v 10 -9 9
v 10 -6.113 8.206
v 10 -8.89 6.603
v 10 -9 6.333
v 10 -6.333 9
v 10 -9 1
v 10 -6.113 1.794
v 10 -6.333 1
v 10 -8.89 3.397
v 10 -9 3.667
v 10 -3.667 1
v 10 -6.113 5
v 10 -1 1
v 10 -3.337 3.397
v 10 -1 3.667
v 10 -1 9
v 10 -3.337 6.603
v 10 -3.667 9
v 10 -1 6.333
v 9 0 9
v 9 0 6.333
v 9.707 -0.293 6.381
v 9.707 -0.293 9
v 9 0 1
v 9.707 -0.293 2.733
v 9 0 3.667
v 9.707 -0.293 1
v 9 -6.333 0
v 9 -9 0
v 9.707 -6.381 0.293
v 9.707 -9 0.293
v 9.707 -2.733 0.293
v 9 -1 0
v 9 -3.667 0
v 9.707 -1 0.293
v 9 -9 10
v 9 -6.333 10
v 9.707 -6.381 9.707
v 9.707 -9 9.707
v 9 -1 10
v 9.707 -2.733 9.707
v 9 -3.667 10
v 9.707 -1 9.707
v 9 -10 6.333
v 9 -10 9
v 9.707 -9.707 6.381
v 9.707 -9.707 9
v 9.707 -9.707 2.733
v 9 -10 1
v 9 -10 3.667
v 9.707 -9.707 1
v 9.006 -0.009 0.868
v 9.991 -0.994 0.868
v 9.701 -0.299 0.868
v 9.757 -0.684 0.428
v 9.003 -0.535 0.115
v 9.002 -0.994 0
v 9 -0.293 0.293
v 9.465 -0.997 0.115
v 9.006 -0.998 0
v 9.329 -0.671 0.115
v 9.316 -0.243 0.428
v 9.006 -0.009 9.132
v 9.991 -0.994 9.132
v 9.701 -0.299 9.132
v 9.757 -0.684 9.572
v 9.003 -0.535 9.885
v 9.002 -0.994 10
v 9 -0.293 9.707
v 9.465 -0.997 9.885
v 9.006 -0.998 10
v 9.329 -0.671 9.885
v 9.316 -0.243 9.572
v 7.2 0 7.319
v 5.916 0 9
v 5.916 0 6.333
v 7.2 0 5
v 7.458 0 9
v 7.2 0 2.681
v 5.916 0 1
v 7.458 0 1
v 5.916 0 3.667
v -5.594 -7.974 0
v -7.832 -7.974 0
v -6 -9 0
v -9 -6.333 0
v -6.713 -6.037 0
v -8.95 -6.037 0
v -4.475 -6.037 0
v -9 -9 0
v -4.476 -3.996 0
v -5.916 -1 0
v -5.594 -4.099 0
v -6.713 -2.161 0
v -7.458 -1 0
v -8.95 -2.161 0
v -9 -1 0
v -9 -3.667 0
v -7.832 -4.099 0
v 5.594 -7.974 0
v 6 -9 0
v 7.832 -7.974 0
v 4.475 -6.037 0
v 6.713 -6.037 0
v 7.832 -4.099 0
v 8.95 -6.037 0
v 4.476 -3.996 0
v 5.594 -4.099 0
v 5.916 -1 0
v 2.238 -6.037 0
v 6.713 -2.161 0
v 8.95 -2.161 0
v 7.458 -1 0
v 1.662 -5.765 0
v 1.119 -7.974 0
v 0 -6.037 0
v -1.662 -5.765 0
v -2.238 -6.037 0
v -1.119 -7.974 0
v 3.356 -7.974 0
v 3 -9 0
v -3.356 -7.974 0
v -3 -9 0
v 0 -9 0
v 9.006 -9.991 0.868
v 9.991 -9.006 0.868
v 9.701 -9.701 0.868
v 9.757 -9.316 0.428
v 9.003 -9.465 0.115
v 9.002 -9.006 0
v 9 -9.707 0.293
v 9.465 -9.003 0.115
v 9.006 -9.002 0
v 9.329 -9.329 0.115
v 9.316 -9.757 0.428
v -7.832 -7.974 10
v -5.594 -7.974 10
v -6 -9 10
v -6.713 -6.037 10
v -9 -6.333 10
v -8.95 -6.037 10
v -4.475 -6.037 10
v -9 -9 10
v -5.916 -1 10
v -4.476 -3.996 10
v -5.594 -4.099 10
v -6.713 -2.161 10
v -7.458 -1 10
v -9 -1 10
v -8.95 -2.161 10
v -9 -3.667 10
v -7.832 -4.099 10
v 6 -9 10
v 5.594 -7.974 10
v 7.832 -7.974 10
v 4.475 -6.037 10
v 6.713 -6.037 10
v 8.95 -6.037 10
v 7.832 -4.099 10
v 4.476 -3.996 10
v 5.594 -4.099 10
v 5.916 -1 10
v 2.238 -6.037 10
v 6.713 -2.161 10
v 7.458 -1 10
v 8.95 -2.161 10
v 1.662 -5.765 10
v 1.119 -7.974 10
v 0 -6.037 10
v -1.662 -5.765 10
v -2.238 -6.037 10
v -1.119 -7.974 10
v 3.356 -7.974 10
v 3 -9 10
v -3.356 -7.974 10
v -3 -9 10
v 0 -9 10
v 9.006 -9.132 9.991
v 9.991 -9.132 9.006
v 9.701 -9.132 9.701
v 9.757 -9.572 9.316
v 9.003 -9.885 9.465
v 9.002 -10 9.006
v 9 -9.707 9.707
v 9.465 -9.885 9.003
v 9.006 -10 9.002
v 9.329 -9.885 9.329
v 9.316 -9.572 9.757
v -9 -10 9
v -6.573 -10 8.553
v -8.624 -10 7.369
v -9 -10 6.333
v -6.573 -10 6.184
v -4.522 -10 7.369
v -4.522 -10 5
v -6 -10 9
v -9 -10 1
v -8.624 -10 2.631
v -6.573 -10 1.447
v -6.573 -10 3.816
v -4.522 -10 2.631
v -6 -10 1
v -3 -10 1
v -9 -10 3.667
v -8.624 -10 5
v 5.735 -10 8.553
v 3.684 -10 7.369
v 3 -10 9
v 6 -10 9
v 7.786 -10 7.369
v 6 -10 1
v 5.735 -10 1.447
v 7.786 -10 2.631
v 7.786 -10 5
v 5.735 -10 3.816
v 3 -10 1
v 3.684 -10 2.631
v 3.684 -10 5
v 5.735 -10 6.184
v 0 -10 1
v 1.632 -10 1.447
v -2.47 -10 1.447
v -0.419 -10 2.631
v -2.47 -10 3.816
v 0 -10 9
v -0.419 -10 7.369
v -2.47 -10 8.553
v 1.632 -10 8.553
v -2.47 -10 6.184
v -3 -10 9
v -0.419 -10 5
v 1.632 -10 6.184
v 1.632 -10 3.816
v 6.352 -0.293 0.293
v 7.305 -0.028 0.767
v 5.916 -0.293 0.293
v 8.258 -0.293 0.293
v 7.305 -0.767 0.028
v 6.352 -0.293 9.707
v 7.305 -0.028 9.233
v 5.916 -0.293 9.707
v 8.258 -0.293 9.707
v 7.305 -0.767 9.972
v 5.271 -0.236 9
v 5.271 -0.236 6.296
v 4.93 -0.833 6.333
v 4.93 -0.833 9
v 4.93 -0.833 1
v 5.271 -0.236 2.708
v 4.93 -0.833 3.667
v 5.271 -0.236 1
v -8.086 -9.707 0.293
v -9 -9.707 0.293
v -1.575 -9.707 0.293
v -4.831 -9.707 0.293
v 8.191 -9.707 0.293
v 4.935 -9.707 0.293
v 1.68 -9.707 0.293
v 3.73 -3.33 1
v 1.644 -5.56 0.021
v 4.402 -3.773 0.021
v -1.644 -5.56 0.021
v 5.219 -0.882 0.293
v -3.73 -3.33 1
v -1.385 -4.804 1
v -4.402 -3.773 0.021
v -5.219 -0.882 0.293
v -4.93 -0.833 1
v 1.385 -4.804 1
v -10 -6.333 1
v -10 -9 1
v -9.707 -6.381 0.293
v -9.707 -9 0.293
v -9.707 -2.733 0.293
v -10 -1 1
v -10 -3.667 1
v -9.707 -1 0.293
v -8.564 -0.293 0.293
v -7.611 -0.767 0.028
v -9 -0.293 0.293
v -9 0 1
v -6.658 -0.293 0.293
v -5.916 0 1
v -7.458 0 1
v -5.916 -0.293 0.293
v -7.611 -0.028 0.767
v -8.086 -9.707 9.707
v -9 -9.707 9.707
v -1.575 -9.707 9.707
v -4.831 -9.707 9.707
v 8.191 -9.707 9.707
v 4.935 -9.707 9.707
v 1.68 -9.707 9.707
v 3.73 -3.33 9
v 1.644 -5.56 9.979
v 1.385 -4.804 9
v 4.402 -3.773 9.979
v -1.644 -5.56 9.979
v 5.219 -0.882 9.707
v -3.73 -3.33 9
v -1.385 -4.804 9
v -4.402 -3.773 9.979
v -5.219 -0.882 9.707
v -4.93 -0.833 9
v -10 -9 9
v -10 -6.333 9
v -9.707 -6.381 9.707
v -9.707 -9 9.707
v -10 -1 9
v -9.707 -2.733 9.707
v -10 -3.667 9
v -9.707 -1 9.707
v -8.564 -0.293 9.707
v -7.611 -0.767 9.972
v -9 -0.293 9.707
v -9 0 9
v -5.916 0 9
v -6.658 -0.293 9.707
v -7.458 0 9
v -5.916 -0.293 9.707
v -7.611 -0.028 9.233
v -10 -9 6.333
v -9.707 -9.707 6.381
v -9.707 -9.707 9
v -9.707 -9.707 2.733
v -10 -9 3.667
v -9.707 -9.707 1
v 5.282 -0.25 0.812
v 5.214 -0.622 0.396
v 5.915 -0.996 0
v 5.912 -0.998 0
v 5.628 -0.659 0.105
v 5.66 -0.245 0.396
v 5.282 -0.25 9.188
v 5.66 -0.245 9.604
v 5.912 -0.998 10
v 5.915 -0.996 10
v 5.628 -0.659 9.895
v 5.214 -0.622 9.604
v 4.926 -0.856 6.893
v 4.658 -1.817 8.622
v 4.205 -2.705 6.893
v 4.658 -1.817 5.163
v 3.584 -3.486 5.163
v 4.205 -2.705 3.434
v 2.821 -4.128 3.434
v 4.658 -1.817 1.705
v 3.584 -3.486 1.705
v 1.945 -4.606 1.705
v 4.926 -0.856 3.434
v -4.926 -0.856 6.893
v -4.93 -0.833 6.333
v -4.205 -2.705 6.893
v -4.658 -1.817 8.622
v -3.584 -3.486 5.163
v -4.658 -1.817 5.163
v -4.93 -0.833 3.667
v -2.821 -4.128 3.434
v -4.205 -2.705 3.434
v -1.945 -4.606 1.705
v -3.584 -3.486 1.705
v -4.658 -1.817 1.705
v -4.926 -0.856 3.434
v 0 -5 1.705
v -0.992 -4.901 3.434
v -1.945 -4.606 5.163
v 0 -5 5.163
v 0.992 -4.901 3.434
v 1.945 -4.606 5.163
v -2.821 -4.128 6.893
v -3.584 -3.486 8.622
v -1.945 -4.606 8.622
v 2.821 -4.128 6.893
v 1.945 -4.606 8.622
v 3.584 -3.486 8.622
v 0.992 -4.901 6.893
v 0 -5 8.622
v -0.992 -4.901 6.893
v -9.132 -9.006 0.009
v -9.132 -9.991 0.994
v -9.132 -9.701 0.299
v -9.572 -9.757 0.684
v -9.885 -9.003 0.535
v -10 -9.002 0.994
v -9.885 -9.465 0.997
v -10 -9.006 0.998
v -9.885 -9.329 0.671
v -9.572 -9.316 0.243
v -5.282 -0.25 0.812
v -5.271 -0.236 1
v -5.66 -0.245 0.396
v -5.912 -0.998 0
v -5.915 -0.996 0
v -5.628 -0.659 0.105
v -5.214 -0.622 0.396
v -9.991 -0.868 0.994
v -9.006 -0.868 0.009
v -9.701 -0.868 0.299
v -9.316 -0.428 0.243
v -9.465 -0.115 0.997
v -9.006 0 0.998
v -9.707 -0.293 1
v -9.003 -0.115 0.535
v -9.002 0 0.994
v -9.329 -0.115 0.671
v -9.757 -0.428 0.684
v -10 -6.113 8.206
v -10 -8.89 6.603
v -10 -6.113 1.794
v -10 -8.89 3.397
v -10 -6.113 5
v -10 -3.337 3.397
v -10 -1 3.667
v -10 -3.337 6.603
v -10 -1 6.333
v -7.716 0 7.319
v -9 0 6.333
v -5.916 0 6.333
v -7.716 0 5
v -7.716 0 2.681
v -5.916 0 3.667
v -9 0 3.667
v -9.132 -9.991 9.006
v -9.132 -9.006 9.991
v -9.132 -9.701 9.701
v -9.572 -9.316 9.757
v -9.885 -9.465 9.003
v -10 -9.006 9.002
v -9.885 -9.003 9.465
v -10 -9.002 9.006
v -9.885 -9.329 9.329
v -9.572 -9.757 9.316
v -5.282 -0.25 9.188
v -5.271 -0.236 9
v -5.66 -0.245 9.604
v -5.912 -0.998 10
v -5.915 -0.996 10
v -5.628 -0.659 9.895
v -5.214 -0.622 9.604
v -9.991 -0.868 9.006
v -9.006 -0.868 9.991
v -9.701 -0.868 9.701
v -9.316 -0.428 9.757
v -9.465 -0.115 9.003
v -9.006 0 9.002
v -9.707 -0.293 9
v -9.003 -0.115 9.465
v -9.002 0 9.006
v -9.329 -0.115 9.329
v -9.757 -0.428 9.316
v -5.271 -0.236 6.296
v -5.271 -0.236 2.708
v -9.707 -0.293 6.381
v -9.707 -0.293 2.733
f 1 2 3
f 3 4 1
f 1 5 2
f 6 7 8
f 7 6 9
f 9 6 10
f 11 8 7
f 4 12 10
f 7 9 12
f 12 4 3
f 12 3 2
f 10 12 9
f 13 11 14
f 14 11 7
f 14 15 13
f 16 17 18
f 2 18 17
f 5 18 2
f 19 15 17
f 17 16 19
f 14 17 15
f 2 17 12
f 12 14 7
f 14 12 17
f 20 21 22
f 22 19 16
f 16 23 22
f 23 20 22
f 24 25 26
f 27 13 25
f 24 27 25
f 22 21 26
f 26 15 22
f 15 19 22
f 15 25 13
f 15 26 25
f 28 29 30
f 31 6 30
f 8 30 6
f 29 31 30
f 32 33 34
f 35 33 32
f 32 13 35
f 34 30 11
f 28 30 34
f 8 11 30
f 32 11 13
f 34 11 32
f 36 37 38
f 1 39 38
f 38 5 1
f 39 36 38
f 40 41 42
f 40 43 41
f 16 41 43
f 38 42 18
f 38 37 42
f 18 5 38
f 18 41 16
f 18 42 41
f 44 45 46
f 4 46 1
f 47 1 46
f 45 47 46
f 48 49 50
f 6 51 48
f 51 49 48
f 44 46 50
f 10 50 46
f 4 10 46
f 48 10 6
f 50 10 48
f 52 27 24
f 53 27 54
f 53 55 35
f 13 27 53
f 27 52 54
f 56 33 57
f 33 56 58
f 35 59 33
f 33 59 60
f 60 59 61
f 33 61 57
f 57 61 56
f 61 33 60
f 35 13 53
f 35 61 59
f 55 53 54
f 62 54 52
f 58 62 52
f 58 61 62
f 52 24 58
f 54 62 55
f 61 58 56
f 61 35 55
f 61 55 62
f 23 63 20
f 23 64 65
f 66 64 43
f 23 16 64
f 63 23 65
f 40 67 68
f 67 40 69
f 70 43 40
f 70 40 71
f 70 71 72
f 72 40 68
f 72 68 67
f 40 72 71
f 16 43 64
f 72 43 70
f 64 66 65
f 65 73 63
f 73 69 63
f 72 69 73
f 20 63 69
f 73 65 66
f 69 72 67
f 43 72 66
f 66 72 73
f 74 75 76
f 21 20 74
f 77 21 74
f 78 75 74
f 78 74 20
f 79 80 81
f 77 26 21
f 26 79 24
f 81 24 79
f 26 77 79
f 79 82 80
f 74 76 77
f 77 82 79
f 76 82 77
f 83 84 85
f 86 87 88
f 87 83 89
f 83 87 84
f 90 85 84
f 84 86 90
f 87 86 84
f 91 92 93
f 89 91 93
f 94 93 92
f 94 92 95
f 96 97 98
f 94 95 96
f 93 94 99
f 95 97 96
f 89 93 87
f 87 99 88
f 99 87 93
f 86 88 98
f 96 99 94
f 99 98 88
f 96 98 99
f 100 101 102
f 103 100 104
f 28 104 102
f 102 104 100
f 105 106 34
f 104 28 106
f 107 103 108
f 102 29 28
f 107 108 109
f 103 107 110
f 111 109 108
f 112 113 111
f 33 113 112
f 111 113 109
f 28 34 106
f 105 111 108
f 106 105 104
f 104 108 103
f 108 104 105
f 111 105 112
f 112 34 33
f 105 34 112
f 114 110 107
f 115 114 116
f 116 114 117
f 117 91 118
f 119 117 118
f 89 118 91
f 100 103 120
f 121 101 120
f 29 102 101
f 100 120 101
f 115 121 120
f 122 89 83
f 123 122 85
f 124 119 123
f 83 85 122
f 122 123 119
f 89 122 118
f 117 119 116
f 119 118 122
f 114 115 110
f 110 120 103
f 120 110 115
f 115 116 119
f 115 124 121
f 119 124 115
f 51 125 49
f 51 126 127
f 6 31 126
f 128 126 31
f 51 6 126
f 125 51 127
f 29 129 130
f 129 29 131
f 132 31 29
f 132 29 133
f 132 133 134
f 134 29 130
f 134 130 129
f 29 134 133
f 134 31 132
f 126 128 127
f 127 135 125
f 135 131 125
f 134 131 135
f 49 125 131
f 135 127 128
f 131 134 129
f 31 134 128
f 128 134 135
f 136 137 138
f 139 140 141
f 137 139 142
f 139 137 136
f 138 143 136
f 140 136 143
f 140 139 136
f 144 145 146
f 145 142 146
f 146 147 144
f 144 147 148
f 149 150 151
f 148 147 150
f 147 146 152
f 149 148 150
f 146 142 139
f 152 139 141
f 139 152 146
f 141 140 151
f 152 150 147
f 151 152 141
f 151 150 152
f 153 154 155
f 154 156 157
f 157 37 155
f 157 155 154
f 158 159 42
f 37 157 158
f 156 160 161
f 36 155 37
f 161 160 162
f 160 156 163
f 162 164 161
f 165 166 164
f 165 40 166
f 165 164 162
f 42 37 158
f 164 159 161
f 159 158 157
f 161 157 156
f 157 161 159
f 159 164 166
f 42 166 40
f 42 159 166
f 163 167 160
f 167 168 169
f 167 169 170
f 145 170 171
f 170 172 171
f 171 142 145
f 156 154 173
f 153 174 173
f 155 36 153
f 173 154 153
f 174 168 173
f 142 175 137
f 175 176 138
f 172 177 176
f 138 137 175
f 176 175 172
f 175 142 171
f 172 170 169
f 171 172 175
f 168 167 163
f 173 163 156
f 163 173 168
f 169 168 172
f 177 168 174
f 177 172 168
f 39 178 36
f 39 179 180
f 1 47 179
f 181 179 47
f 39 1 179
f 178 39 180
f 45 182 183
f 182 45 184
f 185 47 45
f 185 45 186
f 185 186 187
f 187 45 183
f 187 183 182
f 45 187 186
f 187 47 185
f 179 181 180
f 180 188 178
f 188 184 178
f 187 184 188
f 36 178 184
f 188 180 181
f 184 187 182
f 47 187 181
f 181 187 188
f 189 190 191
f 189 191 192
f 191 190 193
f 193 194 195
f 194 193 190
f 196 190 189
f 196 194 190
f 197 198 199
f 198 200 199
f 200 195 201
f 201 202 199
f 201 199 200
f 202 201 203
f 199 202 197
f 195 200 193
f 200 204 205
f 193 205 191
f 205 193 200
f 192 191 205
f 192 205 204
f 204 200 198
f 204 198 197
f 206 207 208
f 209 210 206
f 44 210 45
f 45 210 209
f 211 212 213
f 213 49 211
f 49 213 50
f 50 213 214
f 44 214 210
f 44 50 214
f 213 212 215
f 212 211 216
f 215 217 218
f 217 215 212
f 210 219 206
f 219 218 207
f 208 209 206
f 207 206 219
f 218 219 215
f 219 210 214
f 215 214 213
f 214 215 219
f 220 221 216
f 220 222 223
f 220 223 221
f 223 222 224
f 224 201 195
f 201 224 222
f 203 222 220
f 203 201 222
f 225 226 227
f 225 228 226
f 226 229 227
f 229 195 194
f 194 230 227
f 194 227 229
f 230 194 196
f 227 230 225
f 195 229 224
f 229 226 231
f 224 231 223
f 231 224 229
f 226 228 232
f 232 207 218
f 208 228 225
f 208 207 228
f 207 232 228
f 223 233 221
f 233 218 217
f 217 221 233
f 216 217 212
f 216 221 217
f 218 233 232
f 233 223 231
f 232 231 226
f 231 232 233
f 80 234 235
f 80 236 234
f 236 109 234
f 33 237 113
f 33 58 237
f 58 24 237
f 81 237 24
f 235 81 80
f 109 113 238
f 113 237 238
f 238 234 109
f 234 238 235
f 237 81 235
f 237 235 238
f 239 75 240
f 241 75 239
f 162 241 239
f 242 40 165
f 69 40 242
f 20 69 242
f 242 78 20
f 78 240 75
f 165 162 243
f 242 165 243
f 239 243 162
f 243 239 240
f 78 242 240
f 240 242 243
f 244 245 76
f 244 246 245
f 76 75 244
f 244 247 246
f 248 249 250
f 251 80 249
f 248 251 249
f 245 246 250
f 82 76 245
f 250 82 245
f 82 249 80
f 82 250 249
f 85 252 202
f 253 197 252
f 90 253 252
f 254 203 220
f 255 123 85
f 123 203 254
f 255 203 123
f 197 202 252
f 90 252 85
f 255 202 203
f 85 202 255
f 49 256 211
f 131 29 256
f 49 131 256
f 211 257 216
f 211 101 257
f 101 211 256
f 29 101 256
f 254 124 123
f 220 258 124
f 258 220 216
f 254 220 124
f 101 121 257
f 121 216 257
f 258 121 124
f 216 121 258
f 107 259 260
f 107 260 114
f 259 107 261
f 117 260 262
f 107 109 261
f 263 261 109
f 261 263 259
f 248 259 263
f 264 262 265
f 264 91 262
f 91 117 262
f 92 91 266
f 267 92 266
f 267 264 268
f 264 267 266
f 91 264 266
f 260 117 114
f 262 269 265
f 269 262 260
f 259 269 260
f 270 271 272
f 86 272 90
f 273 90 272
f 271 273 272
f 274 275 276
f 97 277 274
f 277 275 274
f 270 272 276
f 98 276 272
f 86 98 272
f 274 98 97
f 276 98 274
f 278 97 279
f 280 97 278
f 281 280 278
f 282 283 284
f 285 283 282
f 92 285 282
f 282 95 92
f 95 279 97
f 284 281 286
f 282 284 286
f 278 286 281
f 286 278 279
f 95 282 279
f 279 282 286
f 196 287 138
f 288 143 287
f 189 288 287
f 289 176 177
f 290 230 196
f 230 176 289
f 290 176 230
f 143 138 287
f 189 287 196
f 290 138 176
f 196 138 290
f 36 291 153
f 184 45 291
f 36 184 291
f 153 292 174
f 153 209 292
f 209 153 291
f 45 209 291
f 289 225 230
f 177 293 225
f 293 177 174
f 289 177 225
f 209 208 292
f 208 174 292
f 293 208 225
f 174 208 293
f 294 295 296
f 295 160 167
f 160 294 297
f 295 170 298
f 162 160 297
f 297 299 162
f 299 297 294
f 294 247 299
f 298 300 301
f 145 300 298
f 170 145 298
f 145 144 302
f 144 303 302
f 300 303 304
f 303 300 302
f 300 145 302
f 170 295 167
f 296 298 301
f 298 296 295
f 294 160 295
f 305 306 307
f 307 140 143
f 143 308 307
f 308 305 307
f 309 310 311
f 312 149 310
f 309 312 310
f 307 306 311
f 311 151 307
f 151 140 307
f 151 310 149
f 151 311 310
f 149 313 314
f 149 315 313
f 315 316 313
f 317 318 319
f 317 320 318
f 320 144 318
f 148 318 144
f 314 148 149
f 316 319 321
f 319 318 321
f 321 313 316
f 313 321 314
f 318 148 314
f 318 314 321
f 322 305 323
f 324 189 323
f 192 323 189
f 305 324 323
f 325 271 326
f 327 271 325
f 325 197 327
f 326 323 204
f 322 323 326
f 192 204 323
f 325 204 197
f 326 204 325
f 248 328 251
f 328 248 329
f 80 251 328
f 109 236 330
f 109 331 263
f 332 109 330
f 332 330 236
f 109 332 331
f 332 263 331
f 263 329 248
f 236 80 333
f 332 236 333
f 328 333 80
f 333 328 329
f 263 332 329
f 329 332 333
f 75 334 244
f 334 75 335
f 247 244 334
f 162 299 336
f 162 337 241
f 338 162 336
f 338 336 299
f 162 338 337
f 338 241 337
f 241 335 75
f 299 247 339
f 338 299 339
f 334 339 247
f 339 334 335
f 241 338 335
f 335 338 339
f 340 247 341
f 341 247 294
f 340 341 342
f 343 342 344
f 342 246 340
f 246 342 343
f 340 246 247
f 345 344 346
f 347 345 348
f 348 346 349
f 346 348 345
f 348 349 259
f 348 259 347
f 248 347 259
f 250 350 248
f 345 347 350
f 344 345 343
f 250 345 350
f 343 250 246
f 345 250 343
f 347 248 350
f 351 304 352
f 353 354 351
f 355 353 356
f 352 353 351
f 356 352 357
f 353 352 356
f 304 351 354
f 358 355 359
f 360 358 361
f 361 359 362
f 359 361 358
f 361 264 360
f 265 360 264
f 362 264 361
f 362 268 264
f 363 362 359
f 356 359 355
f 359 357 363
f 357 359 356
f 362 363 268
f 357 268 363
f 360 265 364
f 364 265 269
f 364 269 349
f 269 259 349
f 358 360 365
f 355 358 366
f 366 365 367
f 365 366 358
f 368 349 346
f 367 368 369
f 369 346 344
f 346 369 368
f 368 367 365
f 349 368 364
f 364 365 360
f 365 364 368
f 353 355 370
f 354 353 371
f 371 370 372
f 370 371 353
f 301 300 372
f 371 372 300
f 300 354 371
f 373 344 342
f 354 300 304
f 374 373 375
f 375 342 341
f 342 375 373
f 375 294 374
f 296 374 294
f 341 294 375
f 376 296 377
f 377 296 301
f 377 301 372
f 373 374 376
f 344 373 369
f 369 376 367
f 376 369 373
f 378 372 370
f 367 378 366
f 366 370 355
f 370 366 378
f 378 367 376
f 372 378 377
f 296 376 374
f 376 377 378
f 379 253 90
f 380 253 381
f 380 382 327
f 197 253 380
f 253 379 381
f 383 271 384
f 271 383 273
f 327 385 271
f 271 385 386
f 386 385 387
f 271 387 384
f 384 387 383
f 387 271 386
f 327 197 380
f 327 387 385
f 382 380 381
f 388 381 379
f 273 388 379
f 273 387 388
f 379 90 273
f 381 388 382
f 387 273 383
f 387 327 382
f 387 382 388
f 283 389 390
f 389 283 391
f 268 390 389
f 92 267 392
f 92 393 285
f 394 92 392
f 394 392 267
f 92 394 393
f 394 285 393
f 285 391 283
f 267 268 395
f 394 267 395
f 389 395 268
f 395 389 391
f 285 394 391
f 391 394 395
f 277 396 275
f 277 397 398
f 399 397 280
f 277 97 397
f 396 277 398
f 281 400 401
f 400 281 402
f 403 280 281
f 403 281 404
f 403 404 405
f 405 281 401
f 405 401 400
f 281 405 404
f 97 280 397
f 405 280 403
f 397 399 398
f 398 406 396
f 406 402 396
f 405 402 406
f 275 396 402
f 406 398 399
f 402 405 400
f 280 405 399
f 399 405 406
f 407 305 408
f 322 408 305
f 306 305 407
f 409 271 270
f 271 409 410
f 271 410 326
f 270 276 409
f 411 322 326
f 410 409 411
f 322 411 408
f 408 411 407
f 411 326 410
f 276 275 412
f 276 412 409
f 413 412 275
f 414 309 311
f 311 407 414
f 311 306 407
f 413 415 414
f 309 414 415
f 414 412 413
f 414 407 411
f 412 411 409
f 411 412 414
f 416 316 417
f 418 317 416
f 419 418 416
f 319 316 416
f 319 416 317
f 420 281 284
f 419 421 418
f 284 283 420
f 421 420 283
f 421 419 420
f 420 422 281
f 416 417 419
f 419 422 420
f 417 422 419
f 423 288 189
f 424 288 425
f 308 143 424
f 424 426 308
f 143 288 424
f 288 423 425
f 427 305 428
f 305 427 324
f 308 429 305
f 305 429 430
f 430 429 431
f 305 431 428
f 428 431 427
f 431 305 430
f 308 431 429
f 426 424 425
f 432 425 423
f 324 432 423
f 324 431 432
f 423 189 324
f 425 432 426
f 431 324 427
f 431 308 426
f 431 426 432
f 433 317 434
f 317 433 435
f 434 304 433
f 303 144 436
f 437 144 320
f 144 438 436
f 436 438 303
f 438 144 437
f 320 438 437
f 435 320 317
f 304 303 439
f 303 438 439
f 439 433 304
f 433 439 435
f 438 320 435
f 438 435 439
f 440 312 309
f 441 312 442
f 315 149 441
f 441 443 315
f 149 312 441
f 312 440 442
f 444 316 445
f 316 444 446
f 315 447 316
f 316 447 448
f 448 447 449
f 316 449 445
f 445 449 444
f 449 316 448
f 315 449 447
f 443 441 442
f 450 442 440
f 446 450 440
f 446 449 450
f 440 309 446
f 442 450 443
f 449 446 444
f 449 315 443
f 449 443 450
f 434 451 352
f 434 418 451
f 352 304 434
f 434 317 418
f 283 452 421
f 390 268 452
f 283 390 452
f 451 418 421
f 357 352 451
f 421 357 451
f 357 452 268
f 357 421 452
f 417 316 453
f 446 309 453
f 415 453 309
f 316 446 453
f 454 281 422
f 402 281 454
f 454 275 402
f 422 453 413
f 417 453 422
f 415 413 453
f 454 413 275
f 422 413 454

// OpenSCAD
// CSG file generated from FreeCAD 0.18.16093 (Git)
group() {
 group(){
multmatrix([[2.22044604925e-16, -1.0, 0.0,            0.0], [1.0, 2.22044604925e-16, 0.0, 0.0], [0.0, 0.0, 1.0, 0.0], [             0, 0, 0, 1]]){
polyhedron ( points = [[-1.000000,-10.000000,1.000000],[-1.000000,-10.000000,9.000000],[-9.000000,-10.000000,1.000000],[-9.000000,-10.000000,9.000000],[-0.000000,-9.000000,1.000000],[-0.000000,-9.000000,9.000000],[-1.000000,-9.000000,0.000000],[-9.000000,-9.000000,0.000000],[-1.000000,-9.000000,10.000000],[-9.000000,-9.000000,10.000000],[-10.000000,-9.000000,1.000000],[-10.000000,-9.000000,9.000000],[-0.000000,-5.916080,1.000000],[-0.000000,-5.916080,9.000000],[-1.000000,-5.916080,0.000000],[-9.000000,9.000000,-0.000000],[-1.000000,5.916080,0.000000],[-1.000000,9.000000,-0.000000],[-1.000000,-5.916080,10.000000],[-9.000000,9.000000,10.000000],[-1.000000,5.916080,10.000000],[-1.000000,9.000000,10.000000],[-10.000000,9.000000,1.000000],[-10.000000,9.000000,9.000000],[-0.833333,-4.930067,1.000000],[-0.833333,-4.930067,9.000000],[-0.833333,4.930067,1.000000],[-1.000000,10.000000,1.000000],[-9.000000,10.000000,1.000000],[0.000000,5.916080,1.000000],[0.000000,9.000000,1.000000],[-0.833333,4.930067,9.000000],[-1.000000,10.000000,9.000000],[-9.000000,10.000000,9.000000],[0.000000,5.916080,9.000000],[0.000000,9.000000,9.000000],[-1.000000,-10.000000,3.666667],[-1.000000,-10.000000,6.333333],[-3.666667,-10.000000,1.000000],[-6.333333,-10.000000,1.000000],[-3.666667,-10.000000,9.000000],[-6.333333,-10.000000,9.000000],[-9.000000,-10.000000,3.666667],[-9.000000,-10.000000,6.333333],[-0.292893,-9.707107,1.000000],[-0.292893,-9.707107,9.000000],[-0.000000,-9.000000,3.666667],[-0.000000,-9.000000,6.333333],[-1.000000,-9.707107,0.292893],[-3.666667,-9.000000,-0.000000],[-6.333333,-9.000000,-0.000000],[-9.000000,-9.707107,0.292893],[-1.000000,-9.707107,9.707107],[-3.666667,-9.000000,10.000000],[-6.333333,-9.000000,10.000000],[-9.000000,-9.707107,9.707107],[-9.707107,-9.707107,1.000000],[-9.707107,-9.707107,9.000000],[-10.000000,-9.000000,3.666667],[-10.000000,-9.000000,6.333333],[-1.000000,-9.000000,0.000000],[-1.000000,-9.000000,0.000000],[-1.000000,-9.000000,0.000000],[-0.292893,-9.000000,0.292893],[-1.000000,-9.000000,10.000000],[-1.000000,-9.000000,10.000000],[-1.000000,-9.000000,10.000000],[-0.292893,-9.000000,9.707107],[-0.000000,-7.458040,1.000000],[-0.000000,-7.458040,9.000000],[-0.000000,-5.916080,3.666667],[-0.000000,-5.916080,6.333333],[-1.000000,-7.458040,-0.000000],[-9.000000,-6.000000,-0.000000],[-9.000000,-3.000000,-0.000000],[-9.000000,0.000000,-0.000000],[-9.000000,3.000000,-0.000000],[-9.000000,6.000000,-0.000000],[-3.995793,4.475895,0.000000],[-5.765221,1.661995,0.000000],[-5.765221,-1.661995,0.000000],[-3.995793,-4.475895,0.000000],[-3.666667,9.000000,-0.000000],[-6.333333,9.000000,-0.000000],[-1.000000,7.458040,-0.000000],[-9.000000,-9.000000,0.000000],[-9.000000,-9.000000,0.000000],[-9.000000,-9.000000,0.000000],[-9.707107,-9.000000,0.292893],[-1.000000,-7.458040,10.000000],[-9.000000,-6.000000,10.000000],[-9.000000,-3.000000,10.000000],[-9.000000,0.000000,10.000000],[-9.000000,3.000000,10.000000],[-9.000000,6.000000,10.000000],[-3.995793,4.475895,10.000000],[-5.765221,1.661995,10.000000],[-5.765221,-1.661995,10.000000],[-3.995793,-4.475895,10.000000],[-3.666667,9.000000,10.000000],[-6.333333,9.000000,10.000000],[-1.000000,7.458040,10.000000],[-10.000000,-9.000000,9.000000],[-10.000000,-9.000000,9.000000],[-10.000000,-9.000000,9.000000],[-9.707107,-9.000000,9.707107],[-10.000000,-6.000000,1.000000],[-10.000000,-3.000000,1.000000],[-10.000000,0.000000,1.000000],[-10.000000,3.000000,1.000000],[-10.000000,6.000000,1.000000],[-10.000000,-6.000000,9.000000],[-10.000000,-3.000000,9.000000],[-10.000000,0.000000,9.000000],[-10.000000,3.000000,9.000000],[-10.000000,6.000000,9.000000],[-10.000000,9.000000,3.666667],[-10.000000,9.000000,6.333333],[-0.292893,-5.916080,0.292893],[-0.292893,-5.916080,9.707107],[-0.236237,-5.270583,1.000000],[-0.236237,-5.270583,9.000000],[-0.833333,-4.930067,3.666667],[-0.833333,-4.930067,6.333333],[-9.707107,9.000000,0.292893],[-0.882149,5.218863,0.292893],[-3.329828,3.729913,1.000000],[-4.804351,1.384996,1.000000],[-4.804351,-1.384996,1.000000],[-3.329828,-3.729913,1.000000],[-0.882149,-5.218863,0.292893],[-1.000000,9.707107,0.292893],[-9.000000,9.707107,0.292893],[-3.666667,10.000000,1.000000],[-6.333333,10.000000,1.000000],[-0.292893,5.916080,0.292893],[0.000000,7.458040,1.000000],[-0.292893,9.000000,0.292893],[-9.707107,9.000000,9.707107],[-0.882149,5.218863,9.707107],[-3.329828,3.729913,9.000000],[-4.804351,1.384996,9.000000],[-4.804351,-1.384996,9.000000],[-3.329828,-3.729913,9.000000],[-0.882149,-5.218863,9.707107],[-1.000000,9.707107,9.707107],[-9.000000,9.707107,9.707107],[-3.666667,10.000000,9.000000],[-6.333333,10.000000,9.000000],[-0.292893,5.916080,9.707107],[0.000000,7.458040,9.000000],[-0.292893,9.000000,9.707107],[-9.707107,9.707107,1.000000],[-9.000000,10.000000,3.666667],[-9.000000,10.000000,6.333333],[-9.707107,9.707107,9.000000],[-1.000000,-5.916080,0.000000],[-1.000000,-5.916080,0.000000],[-1.000000,-5.916080,0.000000],[-1.000000,-5.916080,10.000000],[-1.000000,-5.916080,10.000000],[-1.000000,-5.916080,10.000000],[-0.833333,4.930067,3.666667],[-0.833333,4.930067,6.333333],[-9.000000,10.000000,1.000000],[-9.000000,10.000000,1.000000],[-9.000000,10.000000,1.000000],[-1.000000,5.916080,0.000000],[-1.000000,5.916080,0.000000],[-1.000000,5.916080,0.000000],[-0.236237,5.270583,1.000000],[0.000000,9.000000,1.000000],[0.000000,9.000000,1.000000],[0.000000,9.000000,1.000000],[-0.292893,9.707107,1.000000],[-1.000000,10.000000,3.666667],[-1.000000,10.000000,6.333333],[0.000000,5.916080,3.666667],[0.000000,5.916080,6.333333],[0.000000,9.000000,3.666667],[0.000000,9.000000,6.333333],[-9.000000,10.000000,9.000000],[-9.000000,10.000000,9.000000],[-9.000000,10.000000,9.000000],[-1.000000,5.916080,10.000000],[-1.000000,5.916080,10.000000],[-1.000000,5.916080,10.000000],[-0.236237,5.270583,9.000000],[0.000000,9.000000,9.000000],[0.000000,9.000000,9.000000],[0.000000,9.000000,9.000000],[-0.292893,9.707107,9.000000],[-6.113249,-10.000000,1.793733],[-6.113249,-10.000000,8.206267],[-8.889957,-10.000000,6.603134],[-8.889957,-10.000000,3.396866],[-6.113249,-10.000000,5.000000],[-3.336540,-10.000000,3.396866],[-3.336540,-10.000000,6.603134],[-0.292893,-9.707107,6.380673],[-0.292893,-9.707107,2.733257],[-6.380673,-9.707107,0.292893],[-2.733257,-9.707107,0.292893],[-6.380673,-9.707107,9.707107],[-2.733257,-9.707107,9.707107],[-9.707107,-9.707107,6.380673],[-9.707107,-9.707107,2.733257],[-0.997414,-9.465114,0.114753],[-0.534886,-9.002586,0.114753],[-0.299037,-9.700963,0.868459],[-0.008705,-9.005512,0.868459],[-0.994488,-9.991296,0.868459],[-0.994260,-9.002397,0.000019],[-0.997604,-9.005740,0.000019],[-0.671110,-9.328890,0.114753],[-0.684114,-9.756659,0.427564],[-0.243341,-9.315886,0.427564],[-0.997414,-9.465114,9.885247],[-0.534886,-9.002586,9.885247],[-0.299037,-9.700963,9.131541],[-0.008705,-9.005512,9.131541],[-0.994488,-9.991296,9.131541],[-0.994260,-9.002397,9.999981],[-0.997604,-9.005740,9.999981],[-0.671110,-9.328890,9.885247],[-0.684114,-9.756659,9.572436],[-0.243341,-9.315886,9.572436],[-0.000000,-7.199661,2.680713],[-0.000000,-7.199661,7.319287],[-0.000000,-7.199661,5.000000],[-6.036599,-4.475196,0.000000],[-6.036599,4.475196,0.000000],[-6.036599,8.950392,0.000000],[-2.160966,6.712794,0.000000],[-6.036599,-8.950392,0.000000],[-2.160966,-6.712794,0.000000],[-6.036599,0.000000,0.000000],[-7.974416,7.831593,0.000000],[-7.974416,5.593995,0.000000],[-6.036599,6.712794,0.000000],[-4.098783,5.593995,0.000000],[-2.160966,8.950392,0.000000],[-4.098783,7.831593,0.000000],[-7.974416,-5.593995,0.000000],[-7.974416,-7.831593,0.000000],[-6.036599,-6.712794,0.000000],[-4.098783,-5.593995,0.000000],[-2.160966,-8.950392,0.000000],[-4.098783,-7.831593,0.000000],[-6.036599,-2.237598,0.000000],[-6.036599,2.237598,0.000000],[-7.974416,-3.356397,0.000000],[-7.974416,3.356397,0.000000],[-7.974416,1.118799,0.000000],[-7.974416,-1.118799,0.000000],[-9.002586,-9.465114,0.114753],[-9.465114,-9.002586,0.114753],[-9.700963,-9.700963,0.868459],[-9.991296,-9.005512,0.868459],[-9.005512,-9.991296,0.868459],[-9.005740,-9.002397,0.000019],[-9.002397,-9.005740,0.000019],[-9.328890,-9.328890,0.114753],[-9.315886,-9.756659,0.427564],[-9.756659,-9.315886,0.427564],[-6.036599,-4.475196,10.000000],[-6.036599,4.475196,10.000000],[-6.036599,8.950392,10.000000],[-2.160966,6.712794,10.000000],[-6.036599,-8.950392,10.000000],[-2.160966,-6.712794,10.000000],[-6.036599,0.000000,10.000000],[-7.974416,7.831593,10.000000],[-7.974416,5.593995,10.000000],[-6.036599,6.712794,10.000000],[-4.098783,5.593995,10.000000],[-2.160966,8.950392,10.000000],[-4.098783,7.831593,10.000000],[-7.974416,-5.593995,10.000000],[-7.974416,-7.831593,10.000000],[-6.036599,-6.712794,10.000000],[-4.098783,-5.593995,10.000000],[-2.160966,-8.950392,10.000000],[-4.098783,-7.831593,10.000000],[-6.036599,-2.237598,10.000000],[-6.036599,2.237598,10.000000],[-7.974416,-3.356397,10.000000],[-7.974416,3.356397,10.000000],[-7.974416,1.118799,10.000000],[-7.974416,-1.118799,10.000000],[-9.885247,-9.465114,9.002586],[-9.885247,-9.002586,9.465114],[-9.131541,-9.700963,9.700963],[-9.131541,-9.005512,9.991296],[-9.131541,-9.991296,9.005512],[-9.999981,-9.002397,9.005740],[-9.999981,-9.005740,9.002397],[-9.885247,-9.328890,9.328890],[-9.572436,-9.756659,9.315886],[-9.572436,-9.315886,9.756659],[-10.000000,4.521509,5.000000],[-10.000000,8.624108,7.368637],[-10.000000,8.624108,2.631363],[-10.000000,-7.786290,7.368637],[-10.000000,-7.786290,2.631363],[-10.000000,-3.683690,5.000000],[-10.000000,0.418909,2.631363],[-10.000000,0.418909,7.368637],[-10.000000,6.572808,8.552956],[-10.000000,6.572808,6.184319],[-10.000000,4.521509,7.368637],[-10.000000,6.572808,3.815681],[-10.000000,6.572808,1.447045],[-10.000000,4.521509,2.631363],[-10.000000,8.624108,5.000000],[-10.000000,-5.734990,8.552956],[-10.000000,-5.734990,1.447045],[-10.000000,-7.786290,5.000000],[-10.000000,-5.734990,3.815681],[-10.000000,-3.683690,2.631363],[-10.000000,-5.734990,6.184319],[-10.000000,-3.683690,7.368637],[-10.000000,-1.632390,1.447045],[-10.000000,2.470209,1.447045],[-10.000000,2.470209,3.815681],[-10.000000,-1.632390,8.552956],[-10.000000,2.470209,6.184319],[-10.000000,2.470209,8.552956],[-10.000000,0.418909,5.000000],[-10.000000,-1.632390,6.184319],[-10.000000,-1.632390,3.815681],[-0.292893,-6.352061,0.292893],[-0.292893,-8.257871,0.292893],[-0.027516,-7.304966,0.767029],[-0.767029,-7.304966,0.027516],[-0.292893,-6.352061,9.707107],[-0.292893,-8.257871,9.707107],[-0.027516,-7.304966,9.232971],[-0.767029,-7.304966,9.972484],[-0.236237,-5.270583,6.295946],[-0.236237,-5.270583,2.707638],[-9.707107,1.575469,0.292893],[-9.707107,-4.935441,0.292893],[-9.707107,8.086378,0.292893],[-9.707107,4.830924,0.292893],[-9.707107,-8.190895,0.292893],[-9.707107,-1.679986,0.292893],[-3.772892,-4.402255,0.020654],[-5.559988,-1.643504,0.020654],[-5.559988,1.643504,0.020654],[-3.772892,4.402255,0.020654],[-6.380673,9.707107,0.292893],[-2.733257,9.707107,0.292893],[-0.292893,8.564018,0.292893],[-0.292893,6.658209,0.292893],[-0.767029,7.611114,0.027516],[-0.027516,7.611114,0.767029],[-9.707107,1.575469,9.707107],[-9.707107,-4.935441,9.707107],[-9.707107,8.086378,9.707107],[-9.707107,4.830924,9.707107],[-9.707107,-8.190895,9.707107],[-9.707107,-1.679986,9.707107],[-3.772892,-4.402255,9.979345],[-5.559988,-1.643504,9.979345],[-5.559988,1.643504,9.979345],[-3.772892,4.402255,9.979345],[-6.380673,9.707107,9.707107],[-2.733257,9.707107,9.707107],[-0.292893,8.564018,9.707107],[-0.292893,6.658209,9.707107],[-0.767029,7.611114,9.972484],[-0.027516,7.611114,9.232971],[-9.707107,9.707107,6.380673],[-9.707107,9.707107,2.733257],[-0.249882,-5.282115,0.811822],[-0.995799,-5.914656,0.000010],[-0.997895,-5.912175,0.000010],[-0.658567,-5.627517,0.105486],[-0.621810,-5.214414,0.396148],[-0.245116,-5.660123,0.396148],[-0.249882,-5.282115,9.188178],[-0.997895,-5.912175,9.999990],[-0.995799,-5.914656,9.999990],[-0.658567,-5.627517,9.894514],[-0.245116,-5.660123,9.603852],[-0.621810,-5.214414,9.603852],[-3.486147,3.584240,5.163412],[-3.486147,-3.584240,5.163412],[-1.816883,-4.658212,8.622211],[-1.816883,-4.658212,1.704613],[-4.606014,-1.945413,1.704613],[-1.816883,4.658212,8.622211],[-4.606014,1.945413,1.704613],[-1.816883,4.658212,1.704613],[-5.000000,0.000000,5.163412],[-4.606014,1.945413,8.622211],[-4.606014,-1.945413,8.622211],[-0.856120,-4.926161,6.892811],[-2.705344,-4.204892,6.892811],[-1.816883,-4.658212,5.163412],[-2.705344,-4.204892,3.434012],[-4.128221,-2.820956,3.434012],[-3.486147,-3.584240,1.704613],[-0.856120,-4.926161,3.434012],[-2.705344,4.204892,6.892811],[-0.856120,4.926161,6.892811],[-1.816883,4.658212,5.163412],[-4.128221,2.820956,3.434012],[-2.705344,4.204892,3.434012],[-3.486147,3.584240,1.704613],[-0.856120,4.926161,3.434012],[-5.000000,0.000000,1.704613],[-4.900514,0.992454,3.434012],[-4.606014,1.945413,5.163412],[-4.900514,-0.992454,3.434012],[-4.606014,-1.945413,5.163412],[-4.128221,2.820956,6.892811],[-3.486147,3.584240,8.622211],[-4.128221,-2.820956,6.892811],[-3.486147,-3.584240,8.622211],[-5.000000,0.000000,8.622211],[-4.900514,-0.992454,6.892811],[-4.900514,0.992454,6.892811],[-9.465114,9.885247,0.997414],[-9.002586,9.885247,0.534886],[-9.700963,9.131541,0.299037],[-9.005512,9.131541,0.008705],[-9.991296,9.131541,0.994488],[-9.002397,9.999981,0.994260],[-9.005740,9.999981,0.997604],[-9.328890,9.885247,0.671110],[-9.756659,9.572436,0.684114],[-9.315886,9.572436,0.243341],[-0.249882,5.282115,0.811822],[-0.997895,5.912175,0.000010],[-0.995799,5.914656,0.000010],[-0.658567,5.627517,0.105486],[-0.245116,5.660123,0.396148],[-0.621810,5.214414,0.396148],[-0.114753,9.002586,0.534886],[-0.114753,9.465114,0.997414],[-0.868459,9.700963,0.299037],[-0.868459,9.991296,0.994488],[-0.868459,9.005512,0.008705],[-0.000019,9.005740,0.997604],[-0.000019,9.002397,0.994260],[-0.114753,9.328890,0.671110],[-0.427564,9.315886,0.243341],[-0.427564,9.756659,0.684114],[-6.113249,10.000000,1.793733],[-6.113249,10.000000,8.206267],[-8.889957,10.000000,6.603134],[-8.889957,10.000000,3.396866],[-6.113249,10.000000,5.000000],[-3.336540,10.000000,3.396866],[-3.336540,10.000000,6.603134],[0.000000,7.716418,2.680713],[0.000000,7.716418,7.319287],[0.000000,7.716418,5.000000],[-9.002586,9.885247,9.465114],[-9.465114,9.885247,9.002586],[-9.700963,9.131541,9.700963],[-9.991296,9.131541,9.005512],[-9.005512,9.131541,9.991296],[-9.005740,9.999981,9.002397],[-9.002397,9.999981,9.005740],[-9.328890,9.885247,9.328890],[-9.315886,9.572436,9.756659],[-9.756659,9.572436,9.315886],[-0.249882,5.282115,9.188178],[-0.997895,5.912175,9.999990],[-0.995799,5.914656,9.999990],[-0.658567,5.627517,9.894514],[-0.245116,5.660123,9.603852],[-0.621810,5.214414,9.603852],[-0.114753,9.002586,9.465114],[-0.114753,9.465114,9.002586],[-0.868459,9.700963,9.700963],[-0.868459,9.991296,9.005512],[-0.868459,9.005512,9.991296],[-0.000019,9.005740,9.002397],[-0.000019,9.002397,9.005740],[-0.114753,9.328890,9.328890],[-0.427564,9.315886,9.756659],[-0.427564,9.756659,9.315886],[-0.236237,5.270583,6.295946],[-0.236237,5.270583,2.707638],[-0.292893,9.707107,6.380673],[-0.292893,9.707107,2.733257]], triangles = [[194,193,3],[3,43,194],[193,41,3],[39,192,2],[195,2,192],[42,2,195],[192,39,38],[42,196,43],[196,195,192],[194,43,196],[193,194,196],[195,196,42],[197,38,0],[192,38,197],[0,36,197],[40,198,1],[198,40,193],[193,40,41],[198,36,37],[37,1,198],[36,198,197],[196,198,193],[192,197,196],[198,196,197],[199,47,5],[1,37,199],[199,45,1],[199,5,45],[46,200,4],[200,0,44],[200,44,4],[46,47,199],[199,36,46],[199,37,36],[0,200,36],[200,46,36],[201,7,50],[201,2,51],[2,201,39],[201,51,7],[49,6,202],[202,6,48],[48,0,202],[38,201,49],[49,201,50],[201,38,39],[0,38,202],[202,38,49],[203,54,9],[203,55,3],[3,41,203],[203,9,55],[53,204,8],[204,52,8],[52,204,1],[40,53,203],[53,54,203],[203,41,40],[1,204,40],[204,53,40],[205,11,59],[3,205,43],[205,3,57],[205,57,11],[58,10,206],[206,56,2],[206,10,56],[58,205,59],[205,58,42],[205,42,43],[2,42,206],[206,42,58],[4,44,210],[209,44,211],[48,215,211],[211,44,0],[209,210,44],[212,6,208],[63,208,6],[6,207,48],[213,207,6],[214,207,213],[212,214,6],[208,214,212],[213,6,214],[211,0,48],[207,214,48],[209,211,215],[210,209,216],[210,216,63],[216,214,63],[63,4,210],[215,216,209],[208,63,214],[215,48,214],[216,215,214],[5,220,45],[219,221,45],[52,221,225],[221,1,45],[219,45,220],[222,218,8],[67,8,218],[8,52,217],[223,8,217],[224,223,217],[222,8,224],[218,222,224],[223,224,8],[221,52,1],[217,52,224],[219,225,221],[220,226,219],[220,67,226],[226,67,224],[67,220,5],[225,219,226],[218,224,67],[225,224,52],[226,224,225],[71,13,228],[228,5,47],[228,47,229],[228,13,69],[5,228,69],[68,12,227],[47,46,229],[4,227,46],[227,4,68],[227,229,46],[12,70,227],[229,71,228],[227,70,229],[229,70,71],[77,237,238],[232,239,83],[231,238,239],[237,239,238],[237,77,15],[15,83,237],[237,83,239],[240,16,78],[240,78,231],[16,240,233],[84,16,233],[82,17,241],[241,84,233],[242,233,240],[241,17,84],[239,240,231],[232,242,239],[240,239,242],[82,232,83],[233,242,241],[232,82,242],[242,82,241],[244,73,243],[245,243,230],[244,245,50],[243,245,244],[49,234,248],[234,50,245],[246,230,81],[50,7,244],[14,246,81],[249,81,230],[246,14,235],[235,72,247],[247,72,6],[14,72,235],[234,49,50],[246,235,248],[245,248,234],[230,246,245],[248,245,246],[247,248,235],[6,49,247],[247,49,248],[81,249,80],[236,80,254],[79,80,236],[250,78,79],[250,79,253],[78,250,231],[251,230,243],[251,73,74],[73,244,7],[73,251,243],[251,74,254],[238,231,252],[77,252,76],[76,253,75],[252,77,238],[253,76,252],[250,252,231],[236,253,79],[252,250,253],[249,254,80],[230,251,249],[254,249,251],[253,236,254],[74,75,254],[254,75,253],[10,258,56],[257,259,56],[259,51,2],[51,259,263],[259,2,56],[257,56,258],[260,256,7],[88,7,256],[7,51,255],[261,7,255],[262,261,255],[260,7,262],[256,260,262],[261,262,7],[255,51,262],[257,263,259],[258,264,257],[258,88,264],[264,88,262],[88,258,10],[263,257,264],[256,262,88],[263,262,51],[264,262,263],[94,273,272],[267,100,274],[266,274,273],[272,273,274],[272,19,94],[19,272,100],[272,274,100],[275,95,20],[275,266,95],[20,268,275],[101,268,20],[99,276,21],[276,268,101],[277,275,268],[276,101,21],[274,266,275],[267,274,277],[275,277,274],[99,100,267],[268,276,277],[267,277,99],[277,276,99],[279,278,90],[280,265,278],[279,54,280],[278,279,280],[53,283,269],[269,280,54],[281,98,265],[54,279,9],[18,98,281],[284,265,98],[281,270,18],[270,282,89],[282,8,89],[18,270,89],[269,54,53],[281,283,270],[280,269,283],[265,280,281],[283,281,280],[282,270,283],[8,282,53],[282,283,53],[98,97,284],[271,289,97],[96,271,97],[285,96,95],[285,288,96],[95,266,285],[286,278,265],[286,91,90],[90,9,279],[90,278,286],[286,289,91],[273,287,266],[94,93,287],[93,92,288],[287,273,94],[288,287,93],[285,266,287],[271,96,288],[287,288,285],[284,97,289],[265,284,286],[289,286,284],[288,289,271],[91,289,92],[289,288,92],[9,293,55],[292,294,55],[294,57,3],[57,294,298],[294,3,55],[292,55,293],[295,291,11],[105,11,291],[11,57,290],[296,11,290],[297,296,290],[295,11,297],[291,295,297],[296,297,11],[290,57,297],[292,298,294],[293,299,292],[293,105,299],[299,105,297],[105,293,9],[298,292,299],[291,297,105],[298,297,57],[299,297,298],[301,308,23],[117,301,23],[309,308,301],[300,310,309],[308,309,310],[23,308,115],[308,310,115],[312,302,22],[312,311,302],[313,300,311],[312,110,313],[311,312,313],[109,313,110],[22,110,312],[309,311,300],[314,116,311],[301,314,309],[311,309,314],[314,301,117],[116,314,117],[302,311,116],[22,302,116],[112,321,315],[315,303,111],[11,303,59],[111,303,11],[304,316,106],[106,10,304],[58,304,10],[317,304,58],[303,317,59],[317,58,59],[318,316,304],[107,106,316],[305,319,318],[316,318,319],[315,320,303],[321,305,320],[315,111,112],[320,315,321],[318,320,305],[317,303,320],[304,317,318],[320,318,317],[107,322,108],[306,323,108],[322,306,108],[324,323,306],[300,313,324],[323,324,313],[108,323,109],[323,313,109],[327,307,113],[307,325,113],[327,326,307],[310,300,326],[327,114,310],[326,327,310],[115,310,114],[113,114,327],[324,326,300],[328,307,326],[306,328,324],[326,324,328],[329,325,307],[305,321,329],[113,325,112],[325,321,112],[325,329,321],[322,330,306],[319,305,330],[330,322,319],[316,319,107],[319,322,107],[329,330,305],[328,306,330],[307,328,329],[330,329,328],[333,331,12],[331,118,12],[331,14,118],[72,332,6],[332,63,6],[332,4,63],[4,332,68],[12,68,333],[334,72,14],[334,332,72],[14,331,334],[333,334,331],[333,68,332],[334,333,332],[337,13,335],[335,13,119],[335,119,18],[89,8,336],[336,8,67],[336,67,5],[5,69,336],[13,337,69],[338,18,89],[338,89,336],[18,338,335],[337,335,338],[337,336,69],[338,336,337],[71,339,121],[339,123,121],[121,13,71],[123,25,121],[122,340,24],[340,12,120],[340,120,24],[122,123,339],[339,71,70],[339,70,122],[12,340,70],[340,122,70],[110,343,77],[343,22,124],[343,124,15],[108,109,341],[77,76,344],[341,109,76],[76,109,344],[343,110,22],[77,343,15],[109,110,344],[344,110,77],[106,345,10],[345,7,88],[345,88,10],[107,342,106],[342,73,106],[345,106,73],[345,73,7],[76,75,341],[75,346,108],[107,108,346],[75,108,341],[342,74,73],[342,107,74],[75,74,346],[346,74,107],[348,129,81],[80,348,81],[347,81,129],[349,348,79],[347,14,81],[14,347,130],[129,130,347],[130,129,24],[127,349,126],[349,78,126],[349,79,78],[350,78,16],[350,16,125],[26,126,125],[350,125,126],[350,126,78],[80,79,348],[127,128,349],[348,349,128],[348,128,129],[351,28,134],[15,351,83],[351,15,132],[351,132,28],[133,27,352],[352,131,17],[352,27,131],[133,351,134],[351,133,82],[351,82,83],[17,82,352],[352,82,133],[355,17,353],[353,17,137],[353,137,30],[136,29,354],[354,29,135],[354,135,16],[16,84,354],[17,355,84],[356,30,136],[356,136,354],[30,356,353],[355,353,356],[355,354,84],[356,354,355],[94,359,115],[359,19,138],[359,138,23],[92,93,357],[115,114,360],[357,93,114],[114,93,360],[359,94,19],[115,359,23],[93,94,360],[360,94,115],[90,361,9],[361,11,105],[361,105,9],[91,358,90],[358,111,90],[361,90,111],[361,111,11],[114,113,357],[113,362,92],[91,92,362],[113,92,357],[358,112,111],[358,91,112],[113,112,362],[362,112,91],[142,364,143],[97,98,364],[363,143,98],[365,96,364],[363,98,18],[18,144,363],[143,363,144],[144,25,143],[141,140,365],[365,140,95],[365,95,96],[366,20,95],[366,139,20],[31,139,140],[366,140,139],[366,95,140],[97,364,96],[141,365,142],[364,142,365],[364,98,143],[367,148,33],[19,100,367],[367,146,19],[367,33,146],[147,368,32],[368,21,145],[368,145,32],[147,148,367],[367,99,147],[367,100,99],[21,368,99],[368,147,99],[371,369,21],[369,151,21],[369,35,151],[150,370,34],[370,149,34],[370,20,149],[20,370,101],[21,101,371],[372,150,35],[372,370,150],[35,369,372],[371,372,369],[371,101,370],[372,371,370],[373,33,154],[373,23,155],[23,373,117],[373,155,33],[153,28,374],[374,28,152],[152,22,374],[116,373,153],[153,373,154],[373,116,117],[22,116,374],[374,116,153],[120,375,24],[379,24,375],[375,120,12],[376,118,14],[130,377,14],[376,14,378],[118,376,378],[377,378,14],[377,130,378],[24,379,130],[380,12,118],[380,118,378],[12,380,375],[379,375,380],[379,378,130],[380,378,379],[121,381,13],[385,13,381],[381,121,25],[382,144,18],[119,383,18],[382,18,384],[144,382,384],[383,384,18],[383,119,384],[13,385,119],[386,25,144],[386,144,384],[25,386,381],[385,381,386],[385,384,119],[386,384,385],[389,25,398],[143,25,389],[399,389,398],[388,399,400],[398,123,399],[400,399,123],[25,123,398],[402,388,401],[403,401,390],[391,402,403],[401,403,402],[129,391,403],[390,129,403],[129,390,24],[24,404,122],[404,390,401],[400,401,388],[404,401,122],[123,122,400],[400,122,401],[404,24,390],[163,31,406],[406,392,405],[407,405,387],[406,405,163],[162,163,407],[407,163,405],[392,406,31],[409,387,408],[410,408,393],[394,409,410],[408,410,409],[393,126,410],[126,393,127],[410,126,394],[126,26,394],[409,394,411],[387,409,407],[411,162,409],[407,409,162],[26,411,394],[411,26,162],[412,127,393],[128,127,412],[391,128,412],[391,129,128],[413,393,408],[414,408,387],[395,413,414],[408,414,413],[402,391,415],[416,415,395],[388,402,416],[415,416,402],[413,395,415],[412,415,391],[393,413,412],[415,412,413],[417,387,405],[418,405,392],[396,417,418],[405,418,417],[396,140,141],[140,396,418],[418,392,140],[399,388,419],[31,140,392],[420,419,397],[389,399,420],[419,420,399],[397,143,420],[143,397,142],[420,143,389],[421,142,422],[141,142,421],[396,141,421],[422,397,419],[416,419,388],[395,422,416],[419,416,422],[417,396,423],[414,423,395],[387,417,414],[423,414,417],[422,395,423],[421,423,396],[397,422,142],[423,421,422],[15,124,427],[426,124,428],[152,432,428],[428,124,22],[426,427,124],[429,28,425],[132,425,28],[28,424,152],[430,424,28],[431,424,430],[429,431,28],[425,431,429],[430,28,431],[428,22,152],[424,431,152],[426,428,432],[427,426,433],[427,433,132],[433,431,132],[132,15,427],[432,433,426],[425,132,431],[432,152,431],[433,432,431],[170,434,29],[438,29,434],[434,170,26],[435,125,16],[135,436,16],[435,16,437],[125,435,437],[436,437,16],[436,135,437],[29,438,135],[439,26,125],[439,125,437],[26,439,434],[438,434,439],[438,437,135],[439,437,438],[27,443,131],[442,444,131],[137,444,448],[444,17,131],[442,131,443],[445,441,30],[174,30,441],[30,137,440],[446,30,440],[447,446,440],[445,30,447],[441,445,447],[446,447,30],[444,137,17],[440,137,447],[442,448,444],[443,449,442],[443,174,449],[449,174,447],[174,443,27],[448,442,449],[441,447,174],[448,447,137],[449,447,448],[452,33,451],[33,452,154],[451,33,148],[134,28,450],[453,450,28],[153,453,28],[450,133,134],[153,154,454],[454,450,453],[452,454,154],[451,454,452],[453,153,454],[455,27,133],[450,455,133],[27,455,175],[147,32,456],[456,451,147],[451,148,147],[456,176,175],[176,456,32],[175,455,456],[454,451,456],[450,454,455],[456,455,454],[180,35,458],[458,34,178],[458,178,459],[458,35,150],[34,458,150],[136,30,457],[178,177,459],[457,29,136],[29,457,177],[457,459,177],[30,179,457],[459,180,458],[457,179,459],[459,179,180],[23,138,463],[462,138,464],[464,19,146],[146,468,464],[464,138,19],[462,463,138],[465,33,461],[155,461,33],[33,460,146],[466,460,33],[467,460,466],[465,467,33],[461,467,465],[466,33,467],[460,467,146],[462,464,468],[463,462,469],[463,469,155],[469,467,155],[155,23,463],[468,469,462],[461,155,467],[468,146,467],[469,468,467],[187,34,470],[474,470,34],[470,31,187],[471,20,139],[149,20,472],[471,473,20],[139,473,471],[472,20,473],[472,473,149],[34,149,474],[475,139,31],[475,473,139],[31,470,475],[474,475,470],[474,149,473],[475,474,473],[32,145,479],[478,145,480],[480,21,151],[151,484,480],[480,145,21],[478,479,145],[481,35,477],[191,477,35],[35,476,151],[482,476,35],[483,476,482],[481,483,35],[477,483,481],[482,35,483],[476,483,151],[478,480,484],[479,478,485],[479,485,191],[485,483,191],[191,32,479],[484,485,478],[477,191,483],[484,151,483],[485,484,483],[163,486,187],[486,178,187],[187,31,163],[178,34,187],[177,487,29],[487,26,170],[487,170,29],[177,178,486],[486,163,162],[486,162,177],[26,487,162],[487,177,162],[488,35,180],[488,32,191],[32,488,176],[488,191,35],[179,30,489],[489,30,174],[174,27,489],[175,488,179],[179,488,180],[488,175,176],[27,175,489],[489,175,179]]);
}
}
}
